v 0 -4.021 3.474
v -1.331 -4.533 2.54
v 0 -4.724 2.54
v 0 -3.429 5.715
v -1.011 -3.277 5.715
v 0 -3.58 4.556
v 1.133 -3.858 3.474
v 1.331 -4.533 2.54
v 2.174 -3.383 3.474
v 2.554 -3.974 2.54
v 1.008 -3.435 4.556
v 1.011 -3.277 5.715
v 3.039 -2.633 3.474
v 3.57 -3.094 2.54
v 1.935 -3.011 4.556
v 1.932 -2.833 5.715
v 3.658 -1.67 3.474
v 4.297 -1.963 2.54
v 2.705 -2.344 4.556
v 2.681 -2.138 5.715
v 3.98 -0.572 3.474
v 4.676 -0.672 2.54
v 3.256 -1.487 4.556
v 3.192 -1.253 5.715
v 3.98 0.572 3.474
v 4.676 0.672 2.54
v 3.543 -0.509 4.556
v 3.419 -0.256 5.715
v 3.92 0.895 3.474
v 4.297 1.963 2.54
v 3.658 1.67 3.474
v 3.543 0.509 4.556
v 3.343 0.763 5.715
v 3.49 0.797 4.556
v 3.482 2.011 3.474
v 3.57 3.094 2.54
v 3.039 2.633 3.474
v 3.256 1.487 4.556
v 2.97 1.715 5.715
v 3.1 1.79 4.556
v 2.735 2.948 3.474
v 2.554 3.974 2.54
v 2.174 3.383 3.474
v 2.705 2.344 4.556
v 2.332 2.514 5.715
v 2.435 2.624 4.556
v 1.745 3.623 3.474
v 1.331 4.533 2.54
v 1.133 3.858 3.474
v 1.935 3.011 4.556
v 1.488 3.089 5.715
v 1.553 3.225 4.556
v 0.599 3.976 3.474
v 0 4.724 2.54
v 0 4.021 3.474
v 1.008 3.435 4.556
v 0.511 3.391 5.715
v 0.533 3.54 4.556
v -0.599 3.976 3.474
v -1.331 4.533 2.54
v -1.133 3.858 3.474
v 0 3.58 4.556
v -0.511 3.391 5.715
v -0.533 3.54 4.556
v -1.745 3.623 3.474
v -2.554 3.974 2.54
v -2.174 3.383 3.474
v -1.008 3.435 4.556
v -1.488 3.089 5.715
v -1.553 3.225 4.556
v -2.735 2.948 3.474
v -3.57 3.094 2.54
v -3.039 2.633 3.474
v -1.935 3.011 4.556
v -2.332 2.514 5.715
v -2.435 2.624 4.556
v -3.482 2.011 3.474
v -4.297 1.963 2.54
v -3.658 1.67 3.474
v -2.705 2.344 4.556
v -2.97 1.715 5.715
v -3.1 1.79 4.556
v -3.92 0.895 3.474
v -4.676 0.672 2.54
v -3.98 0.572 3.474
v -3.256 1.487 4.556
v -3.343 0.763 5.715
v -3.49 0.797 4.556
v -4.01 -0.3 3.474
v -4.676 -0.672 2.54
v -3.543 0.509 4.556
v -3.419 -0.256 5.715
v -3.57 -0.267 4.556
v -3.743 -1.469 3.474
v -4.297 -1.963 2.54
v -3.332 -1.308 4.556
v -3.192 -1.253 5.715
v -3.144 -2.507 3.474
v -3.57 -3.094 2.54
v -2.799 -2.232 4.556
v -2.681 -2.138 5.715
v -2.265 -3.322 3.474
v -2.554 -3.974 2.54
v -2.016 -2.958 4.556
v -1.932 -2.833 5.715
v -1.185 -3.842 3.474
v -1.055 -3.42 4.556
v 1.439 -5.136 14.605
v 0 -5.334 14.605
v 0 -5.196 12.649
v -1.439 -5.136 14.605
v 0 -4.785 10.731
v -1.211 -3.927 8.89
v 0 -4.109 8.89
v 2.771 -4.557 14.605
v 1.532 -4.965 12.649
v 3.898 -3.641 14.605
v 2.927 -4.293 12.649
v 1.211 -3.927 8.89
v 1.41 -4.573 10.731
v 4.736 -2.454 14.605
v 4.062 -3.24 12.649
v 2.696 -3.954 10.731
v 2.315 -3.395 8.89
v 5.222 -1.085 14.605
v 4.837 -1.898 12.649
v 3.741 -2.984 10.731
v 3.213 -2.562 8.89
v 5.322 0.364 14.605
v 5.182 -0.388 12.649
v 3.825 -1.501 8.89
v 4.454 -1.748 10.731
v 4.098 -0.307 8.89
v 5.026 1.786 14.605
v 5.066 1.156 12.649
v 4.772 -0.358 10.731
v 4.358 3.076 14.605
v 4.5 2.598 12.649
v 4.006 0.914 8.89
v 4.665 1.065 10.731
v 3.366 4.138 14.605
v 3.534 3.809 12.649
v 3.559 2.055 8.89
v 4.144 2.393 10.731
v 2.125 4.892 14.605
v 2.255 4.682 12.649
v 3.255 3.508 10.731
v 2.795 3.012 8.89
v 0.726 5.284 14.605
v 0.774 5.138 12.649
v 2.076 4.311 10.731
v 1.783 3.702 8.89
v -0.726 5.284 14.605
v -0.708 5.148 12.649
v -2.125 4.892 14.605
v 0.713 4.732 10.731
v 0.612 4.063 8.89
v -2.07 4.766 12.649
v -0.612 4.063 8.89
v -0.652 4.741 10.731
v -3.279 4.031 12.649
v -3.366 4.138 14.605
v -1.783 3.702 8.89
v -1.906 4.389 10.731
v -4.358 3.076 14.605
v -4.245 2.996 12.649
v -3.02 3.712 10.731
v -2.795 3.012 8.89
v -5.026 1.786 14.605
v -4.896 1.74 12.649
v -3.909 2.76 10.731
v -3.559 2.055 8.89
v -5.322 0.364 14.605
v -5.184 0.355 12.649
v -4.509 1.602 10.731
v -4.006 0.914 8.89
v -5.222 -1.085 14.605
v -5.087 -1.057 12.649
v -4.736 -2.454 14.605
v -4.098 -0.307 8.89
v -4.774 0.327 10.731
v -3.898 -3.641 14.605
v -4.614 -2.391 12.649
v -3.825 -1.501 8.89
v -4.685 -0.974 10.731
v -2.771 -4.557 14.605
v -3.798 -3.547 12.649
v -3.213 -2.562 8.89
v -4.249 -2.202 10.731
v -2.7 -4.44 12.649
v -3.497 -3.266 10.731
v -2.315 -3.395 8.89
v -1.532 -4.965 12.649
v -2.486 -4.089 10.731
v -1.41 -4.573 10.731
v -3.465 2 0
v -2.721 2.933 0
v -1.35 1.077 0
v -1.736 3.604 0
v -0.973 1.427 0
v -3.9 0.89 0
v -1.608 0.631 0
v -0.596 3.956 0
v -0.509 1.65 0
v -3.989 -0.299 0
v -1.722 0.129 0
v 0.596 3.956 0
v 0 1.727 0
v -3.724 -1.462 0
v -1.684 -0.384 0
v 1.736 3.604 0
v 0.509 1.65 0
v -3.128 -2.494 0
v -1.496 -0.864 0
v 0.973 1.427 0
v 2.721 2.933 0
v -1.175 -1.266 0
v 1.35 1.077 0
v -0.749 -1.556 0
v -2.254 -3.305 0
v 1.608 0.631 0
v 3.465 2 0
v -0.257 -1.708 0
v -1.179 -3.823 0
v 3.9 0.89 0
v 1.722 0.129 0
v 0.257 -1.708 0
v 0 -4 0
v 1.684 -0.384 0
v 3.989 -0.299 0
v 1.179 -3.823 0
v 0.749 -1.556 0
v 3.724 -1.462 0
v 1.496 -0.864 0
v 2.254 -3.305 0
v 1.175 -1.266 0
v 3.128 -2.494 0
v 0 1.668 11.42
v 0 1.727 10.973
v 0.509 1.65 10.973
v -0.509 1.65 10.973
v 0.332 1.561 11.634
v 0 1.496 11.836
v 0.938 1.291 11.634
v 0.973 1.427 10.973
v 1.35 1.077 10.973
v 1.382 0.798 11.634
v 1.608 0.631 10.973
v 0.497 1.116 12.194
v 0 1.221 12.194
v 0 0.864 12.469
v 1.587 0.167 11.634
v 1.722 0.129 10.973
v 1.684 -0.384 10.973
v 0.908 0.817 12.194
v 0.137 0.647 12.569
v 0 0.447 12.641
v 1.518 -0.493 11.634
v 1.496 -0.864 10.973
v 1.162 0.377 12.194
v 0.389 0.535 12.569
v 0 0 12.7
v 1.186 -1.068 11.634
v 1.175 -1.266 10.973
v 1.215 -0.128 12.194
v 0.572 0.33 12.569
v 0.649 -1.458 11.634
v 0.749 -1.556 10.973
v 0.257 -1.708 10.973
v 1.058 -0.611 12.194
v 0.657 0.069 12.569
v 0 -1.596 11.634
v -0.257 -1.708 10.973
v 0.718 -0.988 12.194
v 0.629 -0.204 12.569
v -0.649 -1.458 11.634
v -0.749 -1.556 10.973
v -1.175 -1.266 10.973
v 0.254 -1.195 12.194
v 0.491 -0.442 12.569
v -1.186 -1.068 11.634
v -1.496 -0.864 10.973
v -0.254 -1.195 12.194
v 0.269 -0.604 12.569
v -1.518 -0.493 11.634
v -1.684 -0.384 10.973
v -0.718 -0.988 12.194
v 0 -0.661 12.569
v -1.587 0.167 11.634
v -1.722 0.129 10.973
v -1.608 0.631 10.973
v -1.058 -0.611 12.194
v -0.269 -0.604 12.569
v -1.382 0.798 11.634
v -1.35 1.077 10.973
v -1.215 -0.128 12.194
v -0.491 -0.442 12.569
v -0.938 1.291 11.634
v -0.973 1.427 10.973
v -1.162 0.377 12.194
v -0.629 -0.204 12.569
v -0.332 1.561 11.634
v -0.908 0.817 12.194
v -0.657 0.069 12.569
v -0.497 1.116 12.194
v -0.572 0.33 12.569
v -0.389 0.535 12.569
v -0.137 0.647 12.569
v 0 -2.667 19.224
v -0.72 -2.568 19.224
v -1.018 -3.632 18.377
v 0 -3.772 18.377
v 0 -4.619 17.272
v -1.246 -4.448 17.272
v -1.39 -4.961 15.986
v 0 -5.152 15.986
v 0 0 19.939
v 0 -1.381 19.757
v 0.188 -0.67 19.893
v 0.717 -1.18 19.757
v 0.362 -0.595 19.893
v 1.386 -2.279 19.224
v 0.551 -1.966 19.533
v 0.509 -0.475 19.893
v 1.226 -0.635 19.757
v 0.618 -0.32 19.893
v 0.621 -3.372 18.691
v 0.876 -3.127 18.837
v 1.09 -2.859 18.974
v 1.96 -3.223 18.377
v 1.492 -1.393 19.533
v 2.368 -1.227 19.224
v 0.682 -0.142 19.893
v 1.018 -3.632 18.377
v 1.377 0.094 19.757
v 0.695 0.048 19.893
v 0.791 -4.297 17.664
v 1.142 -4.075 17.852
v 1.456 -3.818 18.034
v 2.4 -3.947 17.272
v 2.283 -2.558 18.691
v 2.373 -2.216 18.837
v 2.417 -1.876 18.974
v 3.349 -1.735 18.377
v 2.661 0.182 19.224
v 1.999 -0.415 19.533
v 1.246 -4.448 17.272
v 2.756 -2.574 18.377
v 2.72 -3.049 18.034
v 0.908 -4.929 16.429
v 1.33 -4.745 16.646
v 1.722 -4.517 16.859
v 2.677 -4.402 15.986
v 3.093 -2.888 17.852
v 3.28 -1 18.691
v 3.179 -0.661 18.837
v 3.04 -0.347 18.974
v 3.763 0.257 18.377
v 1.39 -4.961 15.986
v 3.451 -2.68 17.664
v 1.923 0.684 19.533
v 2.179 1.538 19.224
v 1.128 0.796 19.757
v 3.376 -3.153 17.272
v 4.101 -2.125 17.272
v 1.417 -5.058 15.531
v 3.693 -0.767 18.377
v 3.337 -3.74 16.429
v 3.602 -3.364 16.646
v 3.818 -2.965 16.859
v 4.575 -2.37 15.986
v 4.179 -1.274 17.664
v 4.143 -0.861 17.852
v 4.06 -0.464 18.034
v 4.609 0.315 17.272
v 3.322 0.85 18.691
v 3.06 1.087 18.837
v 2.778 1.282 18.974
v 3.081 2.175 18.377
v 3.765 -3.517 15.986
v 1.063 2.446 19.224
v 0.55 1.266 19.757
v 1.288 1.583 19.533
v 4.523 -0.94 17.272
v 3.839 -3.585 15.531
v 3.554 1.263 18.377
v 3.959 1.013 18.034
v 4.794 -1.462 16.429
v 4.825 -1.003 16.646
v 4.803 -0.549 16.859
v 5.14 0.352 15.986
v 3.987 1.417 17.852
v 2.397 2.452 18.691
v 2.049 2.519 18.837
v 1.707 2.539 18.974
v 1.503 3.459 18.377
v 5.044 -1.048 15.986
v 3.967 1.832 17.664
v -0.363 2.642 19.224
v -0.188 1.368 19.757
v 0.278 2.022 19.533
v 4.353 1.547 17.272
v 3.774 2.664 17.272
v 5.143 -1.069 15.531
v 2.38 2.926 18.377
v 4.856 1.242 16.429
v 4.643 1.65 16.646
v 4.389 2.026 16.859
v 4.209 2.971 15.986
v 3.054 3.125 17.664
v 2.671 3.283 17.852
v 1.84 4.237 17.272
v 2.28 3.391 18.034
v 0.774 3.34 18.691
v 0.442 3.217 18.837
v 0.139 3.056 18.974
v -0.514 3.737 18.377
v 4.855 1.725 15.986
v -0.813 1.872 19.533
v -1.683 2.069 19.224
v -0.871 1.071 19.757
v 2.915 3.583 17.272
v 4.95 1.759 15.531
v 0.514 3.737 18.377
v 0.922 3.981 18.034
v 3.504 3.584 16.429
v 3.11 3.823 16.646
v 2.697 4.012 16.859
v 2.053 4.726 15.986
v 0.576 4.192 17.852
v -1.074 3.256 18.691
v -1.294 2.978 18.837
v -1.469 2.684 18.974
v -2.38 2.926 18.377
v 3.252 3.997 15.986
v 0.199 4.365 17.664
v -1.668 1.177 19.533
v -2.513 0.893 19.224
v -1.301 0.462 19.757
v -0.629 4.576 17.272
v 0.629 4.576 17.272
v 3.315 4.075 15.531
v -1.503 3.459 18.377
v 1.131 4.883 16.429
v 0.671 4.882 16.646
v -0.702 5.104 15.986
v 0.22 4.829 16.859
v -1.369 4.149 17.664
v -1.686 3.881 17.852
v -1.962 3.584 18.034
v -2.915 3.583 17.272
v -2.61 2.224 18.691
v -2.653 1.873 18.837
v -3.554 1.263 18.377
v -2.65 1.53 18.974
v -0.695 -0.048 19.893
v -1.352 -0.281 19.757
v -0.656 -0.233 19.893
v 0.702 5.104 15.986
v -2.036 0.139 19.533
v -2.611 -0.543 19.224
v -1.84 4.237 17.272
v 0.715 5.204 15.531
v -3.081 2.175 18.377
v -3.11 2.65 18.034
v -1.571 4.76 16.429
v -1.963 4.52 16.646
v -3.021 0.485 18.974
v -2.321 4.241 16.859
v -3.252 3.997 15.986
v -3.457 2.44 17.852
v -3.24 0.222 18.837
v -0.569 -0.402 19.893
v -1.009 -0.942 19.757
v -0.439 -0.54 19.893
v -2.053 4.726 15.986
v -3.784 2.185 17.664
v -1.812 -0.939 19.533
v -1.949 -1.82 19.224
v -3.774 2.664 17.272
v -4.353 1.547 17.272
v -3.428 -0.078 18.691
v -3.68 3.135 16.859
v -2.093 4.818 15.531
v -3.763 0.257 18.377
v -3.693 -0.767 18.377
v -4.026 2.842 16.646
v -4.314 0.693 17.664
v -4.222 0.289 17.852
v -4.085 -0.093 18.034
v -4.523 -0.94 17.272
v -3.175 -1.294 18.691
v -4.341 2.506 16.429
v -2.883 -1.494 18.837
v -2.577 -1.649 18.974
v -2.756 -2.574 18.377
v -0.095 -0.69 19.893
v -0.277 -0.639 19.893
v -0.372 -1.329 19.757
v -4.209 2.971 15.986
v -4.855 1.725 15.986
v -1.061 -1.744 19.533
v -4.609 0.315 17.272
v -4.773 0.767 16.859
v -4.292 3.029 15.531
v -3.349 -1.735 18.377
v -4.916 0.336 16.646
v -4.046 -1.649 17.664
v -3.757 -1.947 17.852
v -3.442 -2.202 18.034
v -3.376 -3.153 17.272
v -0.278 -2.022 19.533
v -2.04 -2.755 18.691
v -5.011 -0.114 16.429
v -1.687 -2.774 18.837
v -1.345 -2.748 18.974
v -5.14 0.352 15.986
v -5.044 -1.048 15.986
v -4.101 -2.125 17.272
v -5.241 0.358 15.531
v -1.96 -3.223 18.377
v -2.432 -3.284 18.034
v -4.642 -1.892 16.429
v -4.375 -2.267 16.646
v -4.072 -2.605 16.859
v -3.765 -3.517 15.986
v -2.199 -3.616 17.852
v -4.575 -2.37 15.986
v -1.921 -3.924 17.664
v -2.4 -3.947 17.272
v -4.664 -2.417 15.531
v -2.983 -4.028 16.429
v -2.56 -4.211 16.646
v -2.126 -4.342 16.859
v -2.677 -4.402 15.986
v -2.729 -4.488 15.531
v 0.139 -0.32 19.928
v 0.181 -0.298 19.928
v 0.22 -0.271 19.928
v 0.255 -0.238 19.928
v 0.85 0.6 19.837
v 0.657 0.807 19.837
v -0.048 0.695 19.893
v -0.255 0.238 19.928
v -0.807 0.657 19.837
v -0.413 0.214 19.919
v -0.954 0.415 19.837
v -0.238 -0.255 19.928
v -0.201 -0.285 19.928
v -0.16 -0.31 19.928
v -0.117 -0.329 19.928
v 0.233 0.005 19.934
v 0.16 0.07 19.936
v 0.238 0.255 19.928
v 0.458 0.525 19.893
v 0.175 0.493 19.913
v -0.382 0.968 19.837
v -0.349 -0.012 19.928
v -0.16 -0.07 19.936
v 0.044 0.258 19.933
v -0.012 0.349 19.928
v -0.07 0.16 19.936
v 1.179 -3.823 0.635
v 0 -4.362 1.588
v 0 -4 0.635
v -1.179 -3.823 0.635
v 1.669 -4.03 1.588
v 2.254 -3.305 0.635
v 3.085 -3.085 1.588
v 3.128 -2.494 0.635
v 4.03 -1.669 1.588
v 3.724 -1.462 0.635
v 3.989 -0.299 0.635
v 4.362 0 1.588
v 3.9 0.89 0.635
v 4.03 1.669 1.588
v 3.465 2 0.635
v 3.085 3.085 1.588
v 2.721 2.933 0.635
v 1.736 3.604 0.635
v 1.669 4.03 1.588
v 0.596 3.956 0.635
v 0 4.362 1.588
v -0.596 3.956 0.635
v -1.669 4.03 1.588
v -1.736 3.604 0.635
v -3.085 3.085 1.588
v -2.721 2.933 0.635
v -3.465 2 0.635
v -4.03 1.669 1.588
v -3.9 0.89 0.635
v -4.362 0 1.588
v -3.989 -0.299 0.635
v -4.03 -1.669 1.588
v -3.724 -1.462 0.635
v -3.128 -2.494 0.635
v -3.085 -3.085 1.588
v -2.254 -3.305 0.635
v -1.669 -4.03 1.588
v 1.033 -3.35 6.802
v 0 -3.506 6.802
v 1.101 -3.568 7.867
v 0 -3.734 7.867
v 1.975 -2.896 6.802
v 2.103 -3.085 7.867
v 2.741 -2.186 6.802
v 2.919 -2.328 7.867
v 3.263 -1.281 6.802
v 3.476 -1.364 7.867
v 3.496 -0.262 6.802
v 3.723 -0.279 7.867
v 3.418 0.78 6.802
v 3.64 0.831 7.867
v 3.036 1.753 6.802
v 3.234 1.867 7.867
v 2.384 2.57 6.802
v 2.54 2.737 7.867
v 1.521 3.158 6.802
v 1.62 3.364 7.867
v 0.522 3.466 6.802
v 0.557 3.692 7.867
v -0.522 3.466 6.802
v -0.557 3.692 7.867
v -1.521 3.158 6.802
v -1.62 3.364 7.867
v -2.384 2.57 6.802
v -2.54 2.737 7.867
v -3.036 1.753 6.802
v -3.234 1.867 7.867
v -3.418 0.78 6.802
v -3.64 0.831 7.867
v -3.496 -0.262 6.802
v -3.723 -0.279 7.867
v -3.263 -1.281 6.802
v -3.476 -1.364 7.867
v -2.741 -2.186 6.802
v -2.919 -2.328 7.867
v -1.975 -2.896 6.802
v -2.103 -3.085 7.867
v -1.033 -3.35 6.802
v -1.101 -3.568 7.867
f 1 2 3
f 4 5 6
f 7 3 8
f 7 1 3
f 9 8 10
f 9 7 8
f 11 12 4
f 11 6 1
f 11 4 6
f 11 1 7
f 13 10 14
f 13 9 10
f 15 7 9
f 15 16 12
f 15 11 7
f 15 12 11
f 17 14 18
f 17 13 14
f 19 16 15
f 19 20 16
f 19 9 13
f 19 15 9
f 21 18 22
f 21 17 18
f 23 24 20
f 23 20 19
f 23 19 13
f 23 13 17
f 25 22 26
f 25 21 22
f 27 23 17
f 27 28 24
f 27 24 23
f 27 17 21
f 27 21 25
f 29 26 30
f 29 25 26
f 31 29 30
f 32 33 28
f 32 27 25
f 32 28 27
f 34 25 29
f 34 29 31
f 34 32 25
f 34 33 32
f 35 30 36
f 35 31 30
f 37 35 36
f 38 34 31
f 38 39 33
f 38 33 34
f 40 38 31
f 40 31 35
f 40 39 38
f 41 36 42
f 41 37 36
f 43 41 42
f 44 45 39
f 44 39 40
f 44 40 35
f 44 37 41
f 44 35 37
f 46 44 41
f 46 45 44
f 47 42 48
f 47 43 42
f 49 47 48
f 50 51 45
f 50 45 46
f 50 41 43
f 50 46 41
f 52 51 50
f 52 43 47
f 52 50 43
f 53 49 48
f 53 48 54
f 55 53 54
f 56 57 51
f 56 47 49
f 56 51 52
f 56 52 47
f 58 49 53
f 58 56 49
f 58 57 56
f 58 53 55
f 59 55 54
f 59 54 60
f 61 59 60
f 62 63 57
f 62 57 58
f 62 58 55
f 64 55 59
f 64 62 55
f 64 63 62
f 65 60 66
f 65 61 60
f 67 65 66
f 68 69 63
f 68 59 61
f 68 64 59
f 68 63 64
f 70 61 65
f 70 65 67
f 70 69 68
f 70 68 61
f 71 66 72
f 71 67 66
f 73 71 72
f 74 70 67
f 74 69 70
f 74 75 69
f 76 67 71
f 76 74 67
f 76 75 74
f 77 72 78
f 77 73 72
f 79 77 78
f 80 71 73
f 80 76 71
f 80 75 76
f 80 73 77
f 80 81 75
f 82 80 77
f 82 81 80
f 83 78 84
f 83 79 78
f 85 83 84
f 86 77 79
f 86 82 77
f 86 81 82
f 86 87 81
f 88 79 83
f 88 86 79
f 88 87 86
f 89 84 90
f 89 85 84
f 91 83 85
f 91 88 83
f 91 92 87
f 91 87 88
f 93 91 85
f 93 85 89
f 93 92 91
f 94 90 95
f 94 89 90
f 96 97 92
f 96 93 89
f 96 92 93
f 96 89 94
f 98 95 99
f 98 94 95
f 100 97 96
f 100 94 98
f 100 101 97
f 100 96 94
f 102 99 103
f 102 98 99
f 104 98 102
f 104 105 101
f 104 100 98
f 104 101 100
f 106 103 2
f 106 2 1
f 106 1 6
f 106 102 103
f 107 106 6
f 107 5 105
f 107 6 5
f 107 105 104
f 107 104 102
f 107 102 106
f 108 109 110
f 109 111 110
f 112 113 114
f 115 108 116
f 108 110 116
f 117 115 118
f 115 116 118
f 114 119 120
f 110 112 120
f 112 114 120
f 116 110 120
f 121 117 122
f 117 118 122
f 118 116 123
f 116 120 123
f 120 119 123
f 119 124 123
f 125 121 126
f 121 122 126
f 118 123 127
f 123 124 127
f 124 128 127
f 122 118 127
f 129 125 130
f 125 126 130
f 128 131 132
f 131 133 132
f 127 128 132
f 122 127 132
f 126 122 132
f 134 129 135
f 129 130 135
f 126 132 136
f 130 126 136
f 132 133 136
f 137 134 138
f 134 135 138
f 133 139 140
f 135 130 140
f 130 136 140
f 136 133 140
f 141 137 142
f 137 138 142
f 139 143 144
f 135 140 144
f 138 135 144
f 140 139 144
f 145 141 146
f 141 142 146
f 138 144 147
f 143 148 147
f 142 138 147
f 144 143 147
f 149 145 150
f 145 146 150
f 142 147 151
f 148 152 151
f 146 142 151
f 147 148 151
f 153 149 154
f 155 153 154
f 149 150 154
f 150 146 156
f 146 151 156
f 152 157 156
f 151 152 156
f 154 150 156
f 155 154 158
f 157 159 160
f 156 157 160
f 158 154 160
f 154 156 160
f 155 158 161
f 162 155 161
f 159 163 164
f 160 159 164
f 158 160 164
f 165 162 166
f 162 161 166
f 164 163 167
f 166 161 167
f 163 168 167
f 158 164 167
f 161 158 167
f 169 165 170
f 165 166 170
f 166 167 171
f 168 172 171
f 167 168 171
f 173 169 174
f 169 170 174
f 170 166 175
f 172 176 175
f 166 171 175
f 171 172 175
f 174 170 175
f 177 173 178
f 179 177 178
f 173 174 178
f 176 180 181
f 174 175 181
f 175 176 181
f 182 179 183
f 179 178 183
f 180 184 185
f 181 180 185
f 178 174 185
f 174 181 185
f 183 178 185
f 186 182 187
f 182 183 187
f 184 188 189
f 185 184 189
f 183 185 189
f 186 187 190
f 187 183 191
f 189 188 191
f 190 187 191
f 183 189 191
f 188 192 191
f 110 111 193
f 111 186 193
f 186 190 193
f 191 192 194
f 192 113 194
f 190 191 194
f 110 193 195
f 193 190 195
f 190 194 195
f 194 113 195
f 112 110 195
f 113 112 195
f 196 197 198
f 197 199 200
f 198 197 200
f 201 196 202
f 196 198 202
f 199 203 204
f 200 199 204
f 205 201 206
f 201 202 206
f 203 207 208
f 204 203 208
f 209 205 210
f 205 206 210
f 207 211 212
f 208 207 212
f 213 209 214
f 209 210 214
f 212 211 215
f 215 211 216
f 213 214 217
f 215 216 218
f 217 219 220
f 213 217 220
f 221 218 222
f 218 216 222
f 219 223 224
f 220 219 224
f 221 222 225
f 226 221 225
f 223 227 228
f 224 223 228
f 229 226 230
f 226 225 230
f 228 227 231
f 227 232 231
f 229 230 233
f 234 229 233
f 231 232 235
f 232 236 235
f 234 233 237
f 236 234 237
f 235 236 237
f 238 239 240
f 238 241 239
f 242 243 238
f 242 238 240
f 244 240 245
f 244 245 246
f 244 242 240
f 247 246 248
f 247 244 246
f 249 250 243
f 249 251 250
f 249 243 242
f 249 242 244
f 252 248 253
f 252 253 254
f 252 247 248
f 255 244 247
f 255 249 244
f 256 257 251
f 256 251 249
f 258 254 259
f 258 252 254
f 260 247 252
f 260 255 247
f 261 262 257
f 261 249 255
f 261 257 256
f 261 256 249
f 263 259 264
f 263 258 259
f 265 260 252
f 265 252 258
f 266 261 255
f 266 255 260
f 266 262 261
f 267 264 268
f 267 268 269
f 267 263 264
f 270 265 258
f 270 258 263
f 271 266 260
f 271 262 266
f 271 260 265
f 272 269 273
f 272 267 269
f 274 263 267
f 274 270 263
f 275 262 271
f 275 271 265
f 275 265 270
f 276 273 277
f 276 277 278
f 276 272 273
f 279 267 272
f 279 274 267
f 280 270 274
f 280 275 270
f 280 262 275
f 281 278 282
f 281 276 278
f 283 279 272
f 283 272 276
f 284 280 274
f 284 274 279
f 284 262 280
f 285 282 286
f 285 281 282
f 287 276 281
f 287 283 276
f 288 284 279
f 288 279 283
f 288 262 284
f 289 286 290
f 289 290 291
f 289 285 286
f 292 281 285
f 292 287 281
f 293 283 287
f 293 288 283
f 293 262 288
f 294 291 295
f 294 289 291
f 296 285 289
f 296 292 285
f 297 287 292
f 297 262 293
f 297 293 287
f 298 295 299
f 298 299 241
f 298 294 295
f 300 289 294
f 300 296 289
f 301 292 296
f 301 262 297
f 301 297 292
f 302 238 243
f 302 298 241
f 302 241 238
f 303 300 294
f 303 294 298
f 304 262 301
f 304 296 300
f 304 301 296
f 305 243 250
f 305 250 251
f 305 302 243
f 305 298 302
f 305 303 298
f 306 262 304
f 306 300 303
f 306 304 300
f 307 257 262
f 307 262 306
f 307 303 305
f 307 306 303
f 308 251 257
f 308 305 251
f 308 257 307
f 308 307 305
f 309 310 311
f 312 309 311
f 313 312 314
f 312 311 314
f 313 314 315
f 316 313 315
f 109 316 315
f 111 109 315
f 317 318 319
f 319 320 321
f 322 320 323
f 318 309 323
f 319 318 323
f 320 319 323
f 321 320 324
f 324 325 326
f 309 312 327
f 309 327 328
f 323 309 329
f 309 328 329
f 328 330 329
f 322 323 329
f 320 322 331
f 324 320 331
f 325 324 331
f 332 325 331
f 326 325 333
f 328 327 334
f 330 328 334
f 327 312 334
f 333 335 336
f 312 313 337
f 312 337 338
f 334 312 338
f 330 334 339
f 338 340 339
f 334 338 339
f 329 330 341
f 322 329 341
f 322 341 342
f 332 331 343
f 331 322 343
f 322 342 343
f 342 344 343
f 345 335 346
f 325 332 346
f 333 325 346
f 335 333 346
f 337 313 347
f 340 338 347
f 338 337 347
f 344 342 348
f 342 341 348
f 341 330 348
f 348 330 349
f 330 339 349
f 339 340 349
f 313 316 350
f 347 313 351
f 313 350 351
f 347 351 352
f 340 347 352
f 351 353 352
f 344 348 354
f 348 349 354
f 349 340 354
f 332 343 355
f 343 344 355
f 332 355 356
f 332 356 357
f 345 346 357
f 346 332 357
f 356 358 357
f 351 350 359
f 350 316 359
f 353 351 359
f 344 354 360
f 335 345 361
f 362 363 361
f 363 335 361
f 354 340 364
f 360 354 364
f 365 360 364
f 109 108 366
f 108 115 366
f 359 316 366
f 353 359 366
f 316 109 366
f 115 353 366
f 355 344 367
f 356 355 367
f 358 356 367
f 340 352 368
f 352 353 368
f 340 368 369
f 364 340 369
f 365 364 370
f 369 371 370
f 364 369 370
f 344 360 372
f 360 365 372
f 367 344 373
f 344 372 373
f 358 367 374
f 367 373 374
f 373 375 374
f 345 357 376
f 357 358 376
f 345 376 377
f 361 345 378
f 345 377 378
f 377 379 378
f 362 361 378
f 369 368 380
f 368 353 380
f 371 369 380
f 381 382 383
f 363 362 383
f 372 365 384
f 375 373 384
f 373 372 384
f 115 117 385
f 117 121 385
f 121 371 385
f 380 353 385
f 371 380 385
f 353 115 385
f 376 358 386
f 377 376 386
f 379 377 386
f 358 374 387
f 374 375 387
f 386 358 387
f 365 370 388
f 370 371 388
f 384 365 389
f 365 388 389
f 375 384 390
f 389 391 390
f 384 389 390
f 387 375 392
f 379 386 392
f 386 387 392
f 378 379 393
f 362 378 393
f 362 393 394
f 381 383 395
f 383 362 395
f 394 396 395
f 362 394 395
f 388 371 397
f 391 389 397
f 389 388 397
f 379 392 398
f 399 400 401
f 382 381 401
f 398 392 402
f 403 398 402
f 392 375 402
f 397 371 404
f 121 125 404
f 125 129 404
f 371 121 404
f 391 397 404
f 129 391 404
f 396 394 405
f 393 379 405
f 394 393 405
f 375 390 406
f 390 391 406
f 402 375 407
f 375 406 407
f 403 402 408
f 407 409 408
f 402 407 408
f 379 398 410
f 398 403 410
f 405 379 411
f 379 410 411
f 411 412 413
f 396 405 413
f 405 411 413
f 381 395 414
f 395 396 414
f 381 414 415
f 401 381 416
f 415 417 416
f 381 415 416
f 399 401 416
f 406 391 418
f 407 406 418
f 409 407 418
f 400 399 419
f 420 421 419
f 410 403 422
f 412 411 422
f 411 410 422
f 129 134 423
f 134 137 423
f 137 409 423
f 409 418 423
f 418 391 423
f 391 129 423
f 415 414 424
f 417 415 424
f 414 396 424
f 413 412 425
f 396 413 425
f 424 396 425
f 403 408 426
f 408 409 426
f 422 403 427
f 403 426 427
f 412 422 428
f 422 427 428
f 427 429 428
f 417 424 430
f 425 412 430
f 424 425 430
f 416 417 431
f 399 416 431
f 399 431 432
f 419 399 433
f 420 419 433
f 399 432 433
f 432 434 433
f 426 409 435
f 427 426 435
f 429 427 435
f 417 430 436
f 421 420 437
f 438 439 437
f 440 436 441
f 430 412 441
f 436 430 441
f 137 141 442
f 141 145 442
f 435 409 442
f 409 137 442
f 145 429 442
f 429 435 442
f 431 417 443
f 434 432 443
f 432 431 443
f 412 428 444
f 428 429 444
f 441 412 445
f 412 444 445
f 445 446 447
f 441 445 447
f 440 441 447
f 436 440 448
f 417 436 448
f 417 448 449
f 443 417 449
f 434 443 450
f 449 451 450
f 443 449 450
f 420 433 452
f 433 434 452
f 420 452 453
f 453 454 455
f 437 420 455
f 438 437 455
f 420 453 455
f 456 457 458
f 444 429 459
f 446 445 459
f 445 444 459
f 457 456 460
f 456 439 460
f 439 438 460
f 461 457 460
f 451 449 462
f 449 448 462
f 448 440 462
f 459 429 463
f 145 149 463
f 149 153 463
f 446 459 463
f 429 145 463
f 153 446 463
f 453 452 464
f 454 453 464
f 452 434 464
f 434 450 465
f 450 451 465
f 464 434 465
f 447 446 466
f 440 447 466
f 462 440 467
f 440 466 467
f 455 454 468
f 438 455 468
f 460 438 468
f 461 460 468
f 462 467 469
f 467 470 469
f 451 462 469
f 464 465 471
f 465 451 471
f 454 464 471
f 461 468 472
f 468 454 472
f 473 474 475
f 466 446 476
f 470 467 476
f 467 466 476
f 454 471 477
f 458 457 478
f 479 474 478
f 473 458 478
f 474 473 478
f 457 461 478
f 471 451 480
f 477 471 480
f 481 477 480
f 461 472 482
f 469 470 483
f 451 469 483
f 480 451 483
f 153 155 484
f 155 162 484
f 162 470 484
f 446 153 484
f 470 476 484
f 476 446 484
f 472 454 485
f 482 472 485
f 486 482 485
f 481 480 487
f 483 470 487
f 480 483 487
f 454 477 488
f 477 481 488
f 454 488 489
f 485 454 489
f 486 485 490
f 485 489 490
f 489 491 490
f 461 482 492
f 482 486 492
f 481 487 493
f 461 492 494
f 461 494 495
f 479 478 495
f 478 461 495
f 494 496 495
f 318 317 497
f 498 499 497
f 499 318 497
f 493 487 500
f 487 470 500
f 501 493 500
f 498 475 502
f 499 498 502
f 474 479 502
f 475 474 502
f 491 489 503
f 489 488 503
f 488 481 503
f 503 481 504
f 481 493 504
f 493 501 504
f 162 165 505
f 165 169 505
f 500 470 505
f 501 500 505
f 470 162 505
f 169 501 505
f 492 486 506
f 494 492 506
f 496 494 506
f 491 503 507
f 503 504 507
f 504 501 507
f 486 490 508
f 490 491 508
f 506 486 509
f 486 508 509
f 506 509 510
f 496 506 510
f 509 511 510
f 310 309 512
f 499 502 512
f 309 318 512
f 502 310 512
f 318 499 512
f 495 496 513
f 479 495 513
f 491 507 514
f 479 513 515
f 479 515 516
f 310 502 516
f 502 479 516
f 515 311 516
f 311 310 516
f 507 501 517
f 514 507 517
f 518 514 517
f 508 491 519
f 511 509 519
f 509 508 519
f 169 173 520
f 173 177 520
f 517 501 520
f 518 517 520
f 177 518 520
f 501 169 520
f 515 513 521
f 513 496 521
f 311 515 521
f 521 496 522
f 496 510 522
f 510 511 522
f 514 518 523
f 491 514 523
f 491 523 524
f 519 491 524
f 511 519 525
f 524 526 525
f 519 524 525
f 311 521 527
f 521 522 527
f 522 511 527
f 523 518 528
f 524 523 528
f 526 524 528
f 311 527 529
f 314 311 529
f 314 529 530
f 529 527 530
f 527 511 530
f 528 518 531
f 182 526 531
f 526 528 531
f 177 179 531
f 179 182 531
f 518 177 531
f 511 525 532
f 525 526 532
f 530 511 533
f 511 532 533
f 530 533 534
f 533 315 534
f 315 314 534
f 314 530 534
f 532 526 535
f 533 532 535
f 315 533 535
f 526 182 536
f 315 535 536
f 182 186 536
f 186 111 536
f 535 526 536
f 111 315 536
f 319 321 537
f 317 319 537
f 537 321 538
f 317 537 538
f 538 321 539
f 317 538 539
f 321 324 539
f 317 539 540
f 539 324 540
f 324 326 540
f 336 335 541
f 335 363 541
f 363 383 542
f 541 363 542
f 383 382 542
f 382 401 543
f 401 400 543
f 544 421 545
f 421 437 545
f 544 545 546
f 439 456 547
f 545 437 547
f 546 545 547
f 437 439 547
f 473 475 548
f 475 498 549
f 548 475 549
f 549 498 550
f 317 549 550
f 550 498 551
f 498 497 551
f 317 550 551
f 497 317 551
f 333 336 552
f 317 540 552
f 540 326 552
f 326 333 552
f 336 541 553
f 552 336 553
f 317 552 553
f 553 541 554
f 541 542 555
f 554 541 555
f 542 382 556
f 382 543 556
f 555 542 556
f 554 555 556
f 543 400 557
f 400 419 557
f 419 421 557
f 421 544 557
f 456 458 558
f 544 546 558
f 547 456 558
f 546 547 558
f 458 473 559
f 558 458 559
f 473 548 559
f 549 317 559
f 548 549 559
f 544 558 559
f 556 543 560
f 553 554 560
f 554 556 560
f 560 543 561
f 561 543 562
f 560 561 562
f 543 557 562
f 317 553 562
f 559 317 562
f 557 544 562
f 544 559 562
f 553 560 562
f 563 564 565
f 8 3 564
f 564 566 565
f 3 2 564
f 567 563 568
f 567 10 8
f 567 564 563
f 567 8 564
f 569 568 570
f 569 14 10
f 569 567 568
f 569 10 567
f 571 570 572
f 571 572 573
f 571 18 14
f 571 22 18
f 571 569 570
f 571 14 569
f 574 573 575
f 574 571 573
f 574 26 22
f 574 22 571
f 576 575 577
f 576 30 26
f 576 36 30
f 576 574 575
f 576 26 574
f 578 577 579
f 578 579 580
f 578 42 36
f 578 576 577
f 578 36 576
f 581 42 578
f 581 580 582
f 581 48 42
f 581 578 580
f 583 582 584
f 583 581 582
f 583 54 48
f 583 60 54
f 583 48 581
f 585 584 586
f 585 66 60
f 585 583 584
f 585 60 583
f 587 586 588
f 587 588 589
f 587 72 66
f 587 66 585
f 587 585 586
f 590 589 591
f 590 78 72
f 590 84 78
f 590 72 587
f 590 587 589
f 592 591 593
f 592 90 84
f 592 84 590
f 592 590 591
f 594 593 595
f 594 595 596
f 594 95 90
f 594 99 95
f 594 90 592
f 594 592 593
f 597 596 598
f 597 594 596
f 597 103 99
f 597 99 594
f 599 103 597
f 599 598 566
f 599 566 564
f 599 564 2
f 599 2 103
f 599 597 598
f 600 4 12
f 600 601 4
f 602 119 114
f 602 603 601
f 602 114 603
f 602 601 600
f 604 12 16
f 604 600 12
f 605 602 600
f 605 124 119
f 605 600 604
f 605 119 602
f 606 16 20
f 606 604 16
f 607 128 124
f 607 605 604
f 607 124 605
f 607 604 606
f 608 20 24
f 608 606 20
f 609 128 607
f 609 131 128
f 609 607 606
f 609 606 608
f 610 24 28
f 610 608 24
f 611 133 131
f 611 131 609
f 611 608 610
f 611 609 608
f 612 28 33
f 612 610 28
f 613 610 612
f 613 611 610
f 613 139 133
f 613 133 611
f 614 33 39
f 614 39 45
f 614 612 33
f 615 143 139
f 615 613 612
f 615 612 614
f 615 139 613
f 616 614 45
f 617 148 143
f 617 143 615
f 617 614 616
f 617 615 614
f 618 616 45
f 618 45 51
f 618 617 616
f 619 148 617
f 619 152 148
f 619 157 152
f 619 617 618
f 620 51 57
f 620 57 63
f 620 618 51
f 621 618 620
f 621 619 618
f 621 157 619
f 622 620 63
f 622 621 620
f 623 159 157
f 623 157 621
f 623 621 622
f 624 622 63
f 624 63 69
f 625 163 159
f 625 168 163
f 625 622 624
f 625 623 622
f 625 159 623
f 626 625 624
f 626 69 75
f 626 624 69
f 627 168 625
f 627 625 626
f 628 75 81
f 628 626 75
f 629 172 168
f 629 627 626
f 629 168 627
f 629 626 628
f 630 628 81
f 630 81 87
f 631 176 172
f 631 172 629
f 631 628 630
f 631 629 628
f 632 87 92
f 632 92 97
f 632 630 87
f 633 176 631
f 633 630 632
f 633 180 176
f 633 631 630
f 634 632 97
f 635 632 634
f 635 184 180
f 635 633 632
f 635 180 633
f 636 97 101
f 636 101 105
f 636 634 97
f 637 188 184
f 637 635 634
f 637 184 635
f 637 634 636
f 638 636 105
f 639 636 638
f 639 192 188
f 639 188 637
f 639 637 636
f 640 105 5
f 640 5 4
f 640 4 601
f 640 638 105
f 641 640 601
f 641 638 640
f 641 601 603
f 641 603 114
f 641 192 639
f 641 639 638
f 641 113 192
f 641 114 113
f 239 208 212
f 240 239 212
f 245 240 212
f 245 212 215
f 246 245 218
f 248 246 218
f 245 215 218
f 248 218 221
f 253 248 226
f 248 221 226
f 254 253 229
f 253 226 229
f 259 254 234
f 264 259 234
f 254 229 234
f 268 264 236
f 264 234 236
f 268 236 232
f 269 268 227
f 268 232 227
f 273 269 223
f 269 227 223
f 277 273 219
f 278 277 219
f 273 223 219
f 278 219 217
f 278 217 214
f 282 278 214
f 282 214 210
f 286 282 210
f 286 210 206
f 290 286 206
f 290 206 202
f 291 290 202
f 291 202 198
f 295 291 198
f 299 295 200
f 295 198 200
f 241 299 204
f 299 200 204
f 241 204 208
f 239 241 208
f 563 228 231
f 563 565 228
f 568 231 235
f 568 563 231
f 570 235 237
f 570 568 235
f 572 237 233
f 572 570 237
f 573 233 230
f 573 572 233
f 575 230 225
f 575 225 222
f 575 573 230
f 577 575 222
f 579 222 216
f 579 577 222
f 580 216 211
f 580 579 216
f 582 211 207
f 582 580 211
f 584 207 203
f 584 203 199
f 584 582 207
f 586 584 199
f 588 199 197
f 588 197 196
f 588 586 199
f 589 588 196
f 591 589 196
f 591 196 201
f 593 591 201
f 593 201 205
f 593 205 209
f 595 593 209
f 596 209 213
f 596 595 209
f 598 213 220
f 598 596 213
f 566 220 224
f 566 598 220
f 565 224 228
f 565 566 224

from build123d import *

# Parameters (mm, degrees)
SKETCH001_R  = 1.7272
POCKET_DEPTH = 12.7
FILLET_R     = 1.7272


with BuildPart() as part:
    # Sketch → Revolution (revolve)
    with BuildSketch(Plane.YZ):
        with BuildLine():
            Line((-4.0005, 0), (-4.0005, 0.635))
            Line((-4.0005, 0.635), (-4.7244, 2.54))
            ThreePointArc((-4.7244, 2.54), (-3.76531, 4.000453), (-3.429, 5.715))
            ThreePointArc((-3.429, 5.715), (-3.600998, 7.338539), (-4.109357, 8.89))
            ThreePointArc((-5.334, 14.605), (-5.024403, 11.68263), (-4.109357, 8.89))
            ThreePointArc((0, 19.939), (-3.771708, 18.376708), (-5.334, 14.605))
            Line((0, 19.939), (0, 0))
            Line((-4.0005, 0), (0, 0))
        make_face()
    revolve(axis=Axis((0, 0, 0), (0, 0, 1)))

    # Sketch001 (on Face7 of Revolution) → Pocket (cut)
    with BuildSketch(Plane.YX):
        Circle(SKETCH001_R)
    extrude(amount=-POCKET_DEPTH, mode=Mode.SUBTRACT)

    # Fillet
    fillet_edges = [part.edges().sort_by_distance(p)[0] for p in [
        (0, -1.7272, 12.7),
    ]]
    fillet(fillet_edges, radius=FILLET_R)


solid = part.part
